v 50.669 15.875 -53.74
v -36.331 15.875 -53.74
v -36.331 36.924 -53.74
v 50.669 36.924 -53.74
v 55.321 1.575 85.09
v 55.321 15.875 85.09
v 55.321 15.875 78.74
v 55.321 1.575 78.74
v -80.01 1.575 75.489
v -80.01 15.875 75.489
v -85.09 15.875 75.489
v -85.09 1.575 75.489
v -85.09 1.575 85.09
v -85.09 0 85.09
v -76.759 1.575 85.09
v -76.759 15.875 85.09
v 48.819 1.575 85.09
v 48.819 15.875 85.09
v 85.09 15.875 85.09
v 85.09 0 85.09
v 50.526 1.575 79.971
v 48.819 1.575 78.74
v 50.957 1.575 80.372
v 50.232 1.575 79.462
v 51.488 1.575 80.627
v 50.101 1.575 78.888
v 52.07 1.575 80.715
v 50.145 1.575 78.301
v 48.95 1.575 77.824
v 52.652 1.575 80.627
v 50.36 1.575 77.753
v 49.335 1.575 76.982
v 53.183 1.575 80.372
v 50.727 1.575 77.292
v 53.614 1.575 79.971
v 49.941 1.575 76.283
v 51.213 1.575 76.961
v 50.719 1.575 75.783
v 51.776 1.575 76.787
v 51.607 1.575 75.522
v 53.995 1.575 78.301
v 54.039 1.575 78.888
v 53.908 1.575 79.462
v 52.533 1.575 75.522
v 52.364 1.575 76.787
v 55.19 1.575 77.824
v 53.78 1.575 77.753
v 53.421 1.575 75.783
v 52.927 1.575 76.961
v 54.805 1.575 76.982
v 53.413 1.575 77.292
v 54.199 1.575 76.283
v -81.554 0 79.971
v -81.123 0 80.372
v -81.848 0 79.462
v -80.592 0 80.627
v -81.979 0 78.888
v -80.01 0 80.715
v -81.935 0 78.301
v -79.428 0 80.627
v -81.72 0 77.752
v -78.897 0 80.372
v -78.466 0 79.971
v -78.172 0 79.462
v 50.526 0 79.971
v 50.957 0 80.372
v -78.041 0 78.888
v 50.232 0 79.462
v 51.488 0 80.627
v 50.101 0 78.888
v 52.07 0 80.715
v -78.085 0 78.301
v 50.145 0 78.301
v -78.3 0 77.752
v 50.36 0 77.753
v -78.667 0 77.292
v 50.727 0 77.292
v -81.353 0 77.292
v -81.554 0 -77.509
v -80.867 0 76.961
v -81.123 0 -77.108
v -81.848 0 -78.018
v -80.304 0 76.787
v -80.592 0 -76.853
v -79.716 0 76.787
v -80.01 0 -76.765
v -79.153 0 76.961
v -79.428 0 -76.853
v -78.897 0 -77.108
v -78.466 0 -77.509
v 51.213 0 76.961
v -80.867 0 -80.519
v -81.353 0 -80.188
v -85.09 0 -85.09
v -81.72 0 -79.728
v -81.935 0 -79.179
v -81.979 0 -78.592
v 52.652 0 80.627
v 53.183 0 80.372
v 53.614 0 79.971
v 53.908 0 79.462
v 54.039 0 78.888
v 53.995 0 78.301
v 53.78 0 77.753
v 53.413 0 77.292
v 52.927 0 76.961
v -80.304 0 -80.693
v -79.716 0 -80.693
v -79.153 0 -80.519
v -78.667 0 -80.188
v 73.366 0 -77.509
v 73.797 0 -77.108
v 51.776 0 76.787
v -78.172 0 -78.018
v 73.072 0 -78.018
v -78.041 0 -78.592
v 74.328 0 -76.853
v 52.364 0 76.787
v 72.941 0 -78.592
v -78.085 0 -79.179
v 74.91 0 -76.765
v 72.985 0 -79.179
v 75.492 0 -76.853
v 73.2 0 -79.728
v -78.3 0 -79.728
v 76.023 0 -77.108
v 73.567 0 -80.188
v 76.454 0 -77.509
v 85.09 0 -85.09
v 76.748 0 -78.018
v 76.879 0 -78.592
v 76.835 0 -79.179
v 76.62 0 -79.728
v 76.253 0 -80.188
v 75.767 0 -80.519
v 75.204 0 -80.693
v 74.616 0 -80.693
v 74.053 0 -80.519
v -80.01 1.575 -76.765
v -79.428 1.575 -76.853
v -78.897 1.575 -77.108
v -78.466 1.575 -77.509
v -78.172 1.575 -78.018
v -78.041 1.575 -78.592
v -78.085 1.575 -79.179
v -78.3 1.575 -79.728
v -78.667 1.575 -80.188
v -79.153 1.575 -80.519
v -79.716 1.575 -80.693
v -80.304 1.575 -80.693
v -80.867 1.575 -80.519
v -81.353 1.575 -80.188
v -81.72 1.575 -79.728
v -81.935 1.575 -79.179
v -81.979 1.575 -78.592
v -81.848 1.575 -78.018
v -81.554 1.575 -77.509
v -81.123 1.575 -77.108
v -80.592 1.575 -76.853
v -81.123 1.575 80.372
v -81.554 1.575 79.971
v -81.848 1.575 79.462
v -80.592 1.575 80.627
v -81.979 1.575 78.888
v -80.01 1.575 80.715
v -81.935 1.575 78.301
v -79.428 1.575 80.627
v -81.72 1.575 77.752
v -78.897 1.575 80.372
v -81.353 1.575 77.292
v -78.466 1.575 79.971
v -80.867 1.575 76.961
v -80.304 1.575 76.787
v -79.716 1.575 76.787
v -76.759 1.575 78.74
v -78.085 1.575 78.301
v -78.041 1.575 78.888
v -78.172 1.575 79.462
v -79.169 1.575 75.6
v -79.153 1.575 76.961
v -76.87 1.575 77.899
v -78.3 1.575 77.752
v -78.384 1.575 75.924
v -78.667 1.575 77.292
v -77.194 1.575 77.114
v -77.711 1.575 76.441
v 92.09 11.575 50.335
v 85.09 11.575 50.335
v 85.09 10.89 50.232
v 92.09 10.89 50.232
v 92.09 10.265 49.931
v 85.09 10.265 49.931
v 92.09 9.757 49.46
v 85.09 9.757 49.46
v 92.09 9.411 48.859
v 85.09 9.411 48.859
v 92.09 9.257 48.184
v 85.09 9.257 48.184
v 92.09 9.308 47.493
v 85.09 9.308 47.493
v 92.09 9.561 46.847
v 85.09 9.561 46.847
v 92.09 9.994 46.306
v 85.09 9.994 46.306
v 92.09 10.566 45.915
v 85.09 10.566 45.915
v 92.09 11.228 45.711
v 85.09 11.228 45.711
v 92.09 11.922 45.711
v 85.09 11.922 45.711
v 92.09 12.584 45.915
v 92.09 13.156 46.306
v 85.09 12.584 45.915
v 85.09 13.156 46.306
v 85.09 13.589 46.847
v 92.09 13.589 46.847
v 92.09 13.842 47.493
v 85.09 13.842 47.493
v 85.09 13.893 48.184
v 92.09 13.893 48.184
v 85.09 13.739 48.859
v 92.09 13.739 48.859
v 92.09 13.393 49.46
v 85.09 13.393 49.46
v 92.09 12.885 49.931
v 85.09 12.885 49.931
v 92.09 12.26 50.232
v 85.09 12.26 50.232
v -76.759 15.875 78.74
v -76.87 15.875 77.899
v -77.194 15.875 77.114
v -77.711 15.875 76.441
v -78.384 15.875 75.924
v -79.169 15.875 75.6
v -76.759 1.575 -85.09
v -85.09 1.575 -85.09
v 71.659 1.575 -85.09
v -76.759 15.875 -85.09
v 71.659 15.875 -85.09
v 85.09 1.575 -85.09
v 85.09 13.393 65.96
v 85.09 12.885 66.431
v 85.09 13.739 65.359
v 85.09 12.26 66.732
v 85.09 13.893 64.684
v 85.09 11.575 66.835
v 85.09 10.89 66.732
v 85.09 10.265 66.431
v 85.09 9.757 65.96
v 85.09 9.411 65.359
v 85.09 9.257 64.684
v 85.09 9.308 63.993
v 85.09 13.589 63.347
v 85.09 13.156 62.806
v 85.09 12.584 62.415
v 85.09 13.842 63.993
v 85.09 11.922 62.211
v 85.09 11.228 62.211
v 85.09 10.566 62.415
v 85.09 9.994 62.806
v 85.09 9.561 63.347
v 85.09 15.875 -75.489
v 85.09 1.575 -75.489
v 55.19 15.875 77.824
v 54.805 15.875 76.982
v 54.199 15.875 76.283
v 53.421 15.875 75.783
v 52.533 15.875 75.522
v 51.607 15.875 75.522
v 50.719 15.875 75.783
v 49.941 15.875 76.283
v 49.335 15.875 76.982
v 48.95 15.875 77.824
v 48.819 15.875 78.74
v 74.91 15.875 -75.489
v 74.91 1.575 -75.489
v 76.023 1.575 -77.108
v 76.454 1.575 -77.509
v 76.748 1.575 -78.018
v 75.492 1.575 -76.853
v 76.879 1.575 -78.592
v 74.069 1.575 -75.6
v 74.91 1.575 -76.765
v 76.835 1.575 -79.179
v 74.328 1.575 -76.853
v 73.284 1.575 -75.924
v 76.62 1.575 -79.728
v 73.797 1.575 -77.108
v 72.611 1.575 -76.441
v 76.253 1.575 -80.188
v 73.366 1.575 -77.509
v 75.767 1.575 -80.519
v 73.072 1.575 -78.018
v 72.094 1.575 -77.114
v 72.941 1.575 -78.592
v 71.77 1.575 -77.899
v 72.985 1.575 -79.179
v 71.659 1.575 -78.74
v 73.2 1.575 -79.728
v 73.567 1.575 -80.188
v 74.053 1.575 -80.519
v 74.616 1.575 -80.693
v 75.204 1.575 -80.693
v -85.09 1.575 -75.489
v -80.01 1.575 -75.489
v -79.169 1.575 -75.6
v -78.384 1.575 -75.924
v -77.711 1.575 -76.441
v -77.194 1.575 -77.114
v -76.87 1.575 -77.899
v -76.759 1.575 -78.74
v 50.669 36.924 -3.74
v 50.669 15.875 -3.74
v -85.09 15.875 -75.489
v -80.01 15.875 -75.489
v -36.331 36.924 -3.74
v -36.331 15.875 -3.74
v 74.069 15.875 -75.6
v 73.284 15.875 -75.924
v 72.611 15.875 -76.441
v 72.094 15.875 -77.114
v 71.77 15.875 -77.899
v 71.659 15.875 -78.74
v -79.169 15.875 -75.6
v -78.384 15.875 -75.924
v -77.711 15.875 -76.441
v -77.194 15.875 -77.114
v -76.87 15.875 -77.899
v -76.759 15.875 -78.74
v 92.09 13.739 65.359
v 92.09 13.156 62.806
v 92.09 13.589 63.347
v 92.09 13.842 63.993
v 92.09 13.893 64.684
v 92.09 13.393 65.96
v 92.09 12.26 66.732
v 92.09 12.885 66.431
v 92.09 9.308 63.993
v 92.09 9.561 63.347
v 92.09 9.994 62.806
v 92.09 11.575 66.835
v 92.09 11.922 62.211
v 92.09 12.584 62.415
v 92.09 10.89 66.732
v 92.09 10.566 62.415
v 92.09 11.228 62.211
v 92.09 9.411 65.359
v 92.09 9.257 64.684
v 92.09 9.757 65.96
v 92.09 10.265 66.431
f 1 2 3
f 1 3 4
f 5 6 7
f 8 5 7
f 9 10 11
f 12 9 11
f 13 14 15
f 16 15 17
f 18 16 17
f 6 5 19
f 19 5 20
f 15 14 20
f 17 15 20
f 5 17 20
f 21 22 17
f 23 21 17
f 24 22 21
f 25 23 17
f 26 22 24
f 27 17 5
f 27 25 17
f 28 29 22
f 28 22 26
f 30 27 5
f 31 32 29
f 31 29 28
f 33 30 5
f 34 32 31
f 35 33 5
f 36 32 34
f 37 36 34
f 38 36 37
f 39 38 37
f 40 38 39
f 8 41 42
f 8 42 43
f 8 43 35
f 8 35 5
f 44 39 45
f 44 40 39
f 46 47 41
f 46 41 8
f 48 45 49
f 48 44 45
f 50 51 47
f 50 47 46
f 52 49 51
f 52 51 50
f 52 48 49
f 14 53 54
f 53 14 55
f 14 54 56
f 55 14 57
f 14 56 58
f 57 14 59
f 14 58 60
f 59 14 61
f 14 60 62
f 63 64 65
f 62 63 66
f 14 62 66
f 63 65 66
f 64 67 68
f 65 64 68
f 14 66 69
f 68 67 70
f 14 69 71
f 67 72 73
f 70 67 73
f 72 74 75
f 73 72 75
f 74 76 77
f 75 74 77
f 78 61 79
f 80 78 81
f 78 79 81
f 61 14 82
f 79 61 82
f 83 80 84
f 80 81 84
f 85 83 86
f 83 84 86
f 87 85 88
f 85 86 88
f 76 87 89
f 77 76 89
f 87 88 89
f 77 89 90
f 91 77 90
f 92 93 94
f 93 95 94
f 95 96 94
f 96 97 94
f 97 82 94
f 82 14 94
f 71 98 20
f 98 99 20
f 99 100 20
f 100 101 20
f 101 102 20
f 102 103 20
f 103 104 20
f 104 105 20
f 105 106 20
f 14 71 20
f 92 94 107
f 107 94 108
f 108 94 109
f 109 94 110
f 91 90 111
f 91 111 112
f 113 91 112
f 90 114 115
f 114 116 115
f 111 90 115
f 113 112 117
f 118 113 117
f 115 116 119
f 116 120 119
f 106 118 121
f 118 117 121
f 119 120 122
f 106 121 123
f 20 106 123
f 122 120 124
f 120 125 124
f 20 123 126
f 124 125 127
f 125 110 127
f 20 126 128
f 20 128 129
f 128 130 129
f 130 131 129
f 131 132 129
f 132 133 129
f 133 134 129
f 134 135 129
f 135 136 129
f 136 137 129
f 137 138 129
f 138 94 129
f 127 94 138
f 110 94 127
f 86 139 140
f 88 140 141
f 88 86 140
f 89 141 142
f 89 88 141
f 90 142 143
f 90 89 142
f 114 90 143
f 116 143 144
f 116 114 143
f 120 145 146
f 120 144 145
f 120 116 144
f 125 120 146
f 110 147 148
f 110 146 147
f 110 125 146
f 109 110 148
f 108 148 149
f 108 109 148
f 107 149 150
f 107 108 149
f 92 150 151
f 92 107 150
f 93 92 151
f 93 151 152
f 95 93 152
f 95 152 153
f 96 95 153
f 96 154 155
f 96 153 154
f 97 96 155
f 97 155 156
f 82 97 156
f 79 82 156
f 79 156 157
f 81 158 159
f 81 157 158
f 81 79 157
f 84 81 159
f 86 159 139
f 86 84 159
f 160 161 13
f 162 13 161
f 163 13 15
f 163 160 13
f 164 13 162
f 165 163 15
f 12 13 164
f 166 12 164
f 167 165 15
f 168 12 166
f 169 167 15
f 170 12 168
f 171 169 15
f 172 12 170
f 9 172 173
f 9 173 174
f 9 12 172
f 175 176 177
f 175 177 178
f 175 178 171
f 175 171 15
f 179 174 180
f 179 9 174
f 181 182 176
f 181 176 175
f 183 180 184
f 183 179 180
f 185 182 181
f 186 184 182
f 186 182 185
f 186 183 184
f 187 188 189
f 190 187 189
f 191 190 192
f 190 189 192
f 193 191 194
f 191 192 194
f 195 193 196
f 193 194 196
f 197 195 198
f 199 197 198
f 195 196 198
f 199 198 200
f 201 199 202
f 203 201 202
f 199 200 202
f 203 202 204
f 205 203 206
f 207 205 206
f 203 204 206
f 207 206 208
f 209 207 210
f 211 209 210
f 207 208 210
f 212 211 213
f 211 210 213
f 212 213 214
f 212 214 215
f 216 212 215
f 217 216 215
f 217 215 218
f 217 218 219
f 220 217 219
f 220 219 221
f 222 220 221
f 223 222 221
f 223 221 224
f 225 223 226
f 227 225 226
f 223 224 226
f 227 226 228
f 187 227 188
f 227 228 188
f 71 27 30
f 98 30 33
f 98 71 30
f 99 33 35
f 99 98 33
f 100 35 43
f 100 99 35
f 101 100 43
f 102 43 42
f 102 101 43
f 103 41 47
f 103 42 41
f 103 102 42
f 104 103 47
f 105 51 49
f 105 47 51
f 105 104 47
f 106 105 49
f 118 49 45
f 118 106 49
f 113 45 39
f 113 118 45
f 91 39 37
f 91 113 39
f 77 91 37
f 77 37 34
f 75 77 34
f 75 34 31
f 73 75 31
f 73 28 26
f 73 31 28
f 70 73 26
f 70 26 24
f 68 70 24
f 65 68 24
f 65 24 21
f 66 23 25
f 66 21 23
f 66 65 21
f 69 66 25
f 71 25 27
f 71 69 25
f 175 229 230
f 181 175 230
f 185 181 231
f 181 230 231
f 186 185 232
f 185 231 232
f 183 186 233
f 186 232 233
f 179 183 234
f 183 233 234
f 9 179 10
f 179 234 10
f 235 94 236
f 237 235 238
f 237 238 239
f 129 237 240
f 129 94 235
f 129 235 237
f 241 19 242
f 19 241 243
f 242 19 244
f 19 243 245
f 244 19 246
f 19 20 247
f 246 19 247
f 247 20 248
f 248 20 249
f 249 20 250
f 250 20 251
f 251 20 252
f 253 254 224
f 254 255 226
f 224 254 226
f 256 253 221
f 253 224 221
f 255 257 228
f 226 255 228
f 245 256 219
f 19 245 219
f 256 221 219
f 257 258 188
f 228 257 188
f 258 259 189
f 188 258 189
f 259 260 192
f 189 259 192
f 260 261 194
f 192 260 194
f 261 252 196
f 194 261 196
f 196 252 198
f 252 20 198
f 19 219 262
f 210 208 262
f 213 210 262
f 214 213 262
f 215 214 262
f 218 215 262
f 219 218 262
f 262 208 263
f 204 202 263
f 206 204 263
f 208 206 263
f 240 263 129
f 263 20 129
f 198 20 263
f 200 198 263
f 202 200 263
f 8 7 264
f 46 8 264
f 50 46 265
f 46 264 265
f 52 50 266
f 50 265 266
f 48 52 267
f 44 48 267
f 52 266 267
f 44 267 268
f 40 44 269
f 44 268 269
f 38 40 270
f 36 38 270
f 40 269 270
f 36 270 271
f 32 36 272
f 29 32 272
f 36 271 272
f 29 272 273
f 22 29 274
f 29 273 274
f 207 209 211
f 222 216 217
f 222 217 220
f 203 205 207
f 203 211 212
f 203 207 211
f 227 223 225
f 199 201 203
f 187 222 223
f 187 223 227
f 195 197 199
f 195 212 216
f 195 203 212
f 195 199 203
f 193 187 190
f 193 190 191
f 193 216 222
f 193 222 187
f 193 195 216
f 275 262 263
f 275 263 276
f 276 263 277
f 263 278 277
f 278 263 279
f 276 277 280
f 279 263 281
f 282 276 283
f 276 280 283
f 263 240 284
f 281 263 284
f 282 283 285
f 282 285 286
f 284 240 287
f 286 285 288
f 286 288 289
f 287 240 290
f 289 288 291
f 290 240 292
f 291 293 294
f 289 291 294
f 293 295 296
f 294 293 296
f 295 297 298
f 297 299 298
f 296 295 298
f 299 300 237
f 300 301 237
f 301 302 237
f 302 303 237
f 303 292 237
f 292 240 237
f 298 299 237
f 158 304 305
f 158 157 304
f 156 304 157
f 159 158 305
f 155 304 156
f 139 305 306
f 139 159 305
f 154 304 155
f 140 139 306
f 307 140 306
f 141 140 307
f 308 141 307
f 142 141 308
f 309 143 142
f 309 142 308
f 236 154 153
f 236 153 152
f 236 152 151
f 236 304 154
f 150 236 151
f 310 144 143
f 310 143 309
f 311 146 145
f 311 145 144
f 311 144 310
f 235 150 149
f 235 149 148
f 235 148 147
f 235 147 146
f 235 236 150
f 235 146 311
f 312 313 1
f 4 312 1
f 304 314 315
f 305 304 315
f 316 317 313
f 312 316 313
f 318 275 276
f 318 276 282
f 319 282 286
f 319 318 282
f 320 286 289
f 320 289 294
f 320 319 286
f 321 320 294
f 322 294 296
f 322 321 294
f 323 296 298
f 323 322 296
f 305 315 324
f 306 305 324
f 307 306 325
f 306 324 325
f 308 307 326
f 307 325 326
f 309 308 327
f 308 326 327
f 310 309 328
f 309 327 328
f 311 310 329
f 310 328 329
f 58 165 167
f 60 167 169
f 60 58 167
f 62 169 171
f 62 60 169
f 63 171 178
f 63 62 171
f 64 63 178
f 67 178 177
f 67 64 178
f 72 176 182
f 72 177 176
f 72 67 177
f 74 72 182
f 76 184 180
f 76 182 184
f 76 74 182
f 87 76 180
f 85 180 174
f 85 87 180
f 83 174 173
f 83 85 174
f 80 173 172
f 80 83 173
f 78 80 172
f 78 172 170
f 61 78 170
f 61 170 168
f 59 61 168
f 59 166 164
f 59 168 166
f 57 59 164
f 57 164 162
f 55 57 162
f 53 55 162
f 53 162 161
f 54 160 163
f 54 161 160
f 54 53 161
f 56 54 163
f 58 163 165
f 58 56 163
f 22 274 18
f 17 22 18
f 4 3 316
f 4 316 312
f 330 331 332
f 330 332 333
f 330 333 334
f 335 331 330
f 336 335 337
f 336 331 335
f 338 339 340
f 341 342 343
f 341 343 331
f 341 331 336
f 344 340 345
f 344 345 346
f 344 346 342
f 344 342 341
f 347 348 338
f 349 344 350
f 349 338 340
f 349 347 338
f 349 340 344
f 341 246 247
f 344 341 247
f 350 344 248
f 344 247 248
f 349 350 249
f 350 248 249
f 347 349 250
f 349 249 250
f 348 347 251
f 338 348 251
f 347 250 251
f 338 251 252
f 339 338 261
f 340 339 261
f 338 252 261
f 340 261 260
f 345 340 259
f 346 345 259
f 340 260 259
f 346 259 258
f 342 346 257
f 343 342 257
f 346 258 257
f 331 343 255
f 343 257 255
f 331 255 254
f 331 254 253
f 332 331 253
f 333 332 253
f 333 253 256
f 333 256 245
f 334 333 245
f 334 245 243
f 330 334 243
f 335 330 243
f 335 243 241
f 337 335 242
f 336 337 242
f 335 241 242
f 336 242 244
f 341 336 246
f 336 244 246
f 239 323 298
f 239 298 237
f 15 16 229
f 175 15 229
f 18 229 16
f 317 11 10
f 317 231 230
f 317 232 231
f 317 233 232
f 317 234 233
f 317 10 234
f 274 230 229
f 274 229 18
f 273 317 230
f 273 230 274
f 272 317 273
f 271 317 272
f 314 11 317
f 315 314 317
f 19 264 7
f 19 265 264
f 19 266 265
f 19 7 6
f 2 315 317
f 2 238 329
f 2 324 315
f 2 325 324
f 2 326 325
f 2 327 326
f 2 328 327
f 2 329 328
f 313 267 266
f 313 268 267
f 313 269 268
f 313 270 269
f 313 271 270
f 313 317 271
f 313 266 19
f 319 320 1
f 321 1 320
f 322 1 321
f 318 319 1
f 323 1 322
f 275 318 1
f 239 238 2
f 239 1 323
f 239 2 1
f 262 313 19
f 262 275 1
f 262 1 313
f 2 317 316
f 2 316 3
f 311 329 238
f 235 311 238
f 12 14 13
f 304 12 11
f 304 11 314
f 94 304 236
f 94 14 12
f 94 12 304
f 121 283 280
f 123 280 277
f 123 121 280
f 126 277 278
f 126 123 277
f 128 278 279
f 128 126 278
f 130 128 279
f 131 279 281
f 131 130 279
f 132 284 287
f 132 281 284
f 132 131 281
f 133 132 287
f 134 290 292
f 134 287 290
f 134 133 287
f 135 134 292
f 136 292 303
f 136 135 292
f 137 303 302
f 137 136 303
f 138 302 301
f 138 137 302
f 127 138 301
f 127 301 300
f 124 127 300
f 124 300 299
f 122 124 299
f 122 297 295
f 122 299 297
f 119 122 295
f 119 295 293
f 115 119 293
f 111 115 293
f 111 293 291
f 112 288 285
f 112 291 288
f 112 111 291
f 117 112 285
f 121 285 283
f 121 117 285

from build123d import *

# Parameters (mm, degrees)
SKETCH1_W           = 170.18
SKETCH1_H           = 170.18
SKETCH1_R           = 1.9750024
SKETCH1_R_2         = 1.974999987
BOSS_EXTRUDE1_DEPTH = 15.875
CUT_EXTRUDE1_DEPTH  = 14.300000102
SKETCH4_W           = 86.99999999
SKETCH4_H           = 50.000000076
BOSS_EXTRUDE2_DEPTH = 21.048998796
SKETCH5_R           = 2.325000049
BOSS_EXTRUDE3_DEPTH = 6.99999997


with BuildPart() as part:
    # Sketch1 → Boss-Extrude1 (new body)
    with BuildSketch(Plane(origin=(0, 0, 0), x_dir=(1, 0, 0), z_dir=(0, 1, 0))):
        Rectangle(SKETCH1_W, SKETCH1_H)
        with Locations(Location((-80.01, 78.74, 0), (0, 0, 270))):
            Circle(SKETCH1_R, mode=Mode.SUBTRACT)
        with Locations(Location((74.91000004, 78.74, 0), (0, 0, 270))):
            Circle(SKETCH1_R, mode=Mode.SUBTRACT)
        with Locations(Location((-80.01, -78.74, 0), (0, 0, 270))):
            Circle(SKETCH1_R, mode=Mode.SUBTRACT)
        with Locations(Location((52.07, -78.74, 0), (0, 0, 270))):
            Circle(SKETCH1_R_2, mode=Mode.SUBTRACT)
    extrude(amount=BOSS_EXTRUDE1_DEPTH)

    # Sketch3 → Cut-Extrude1 (cut)
    with BuildSketch(Plane(origin=(0, 15.875, 0), x_dir=(1, 0, 0), z_dir=(0, 1, 0))):
        with BuildLine():
            Line((-76.7588, 78.74), (-76.7588, 85.09))
            Line((-76.7588, 85.09), (-85.09, 85.09))
            Line((-85.09, 85.09), (-85.09, 75.4888))
            Line((-85.09, 75.4888), (-80.01, 75.4888))
            ThreePointArc((-80.01, 75.4888), (-77.711054433, 76.441054433), (-76.7588, 78.74))
        make_face()
        with BuildLine():
            Line((71.65880004, 78.74), (71.65880004, 85.09))
            Line((71.65880004, 85.09), (85.09, 85.09))
            Line((85.09, 85.09), (85.09, 75.4888))
            Line((85.09, 75.4888), (74.91000004, 75.4888))
            ThreePointArc((74.91000004, 75.4888), (72.611054473, 76.441054433), (71.65880004, 78.74))
        make_face()
        with BuildLine():
            Line((48.8188, -78.74), (48.8188, -85.09))
            Line((48.8188, -85.09), (55.3212, -85.09))
            Line((55.3212, -85.09), (55.3212, -78.74))
            ThreePointArc((55.3212, -78.74), (52.07, -75.4888), (48.8188, -78.74))
        make_face()
        with BuildLine():
            Line((-80.01, -75.4888), (-85.09, -75.4888))
            Line((-85.09, -75.4888), (-85.09, -85.09))
            Line((-85.09, -85.09), (-76.7588, -85.09))
            Line((-76.7588, -85.09), (-76.7588, -78.74))
            ThreePointArc((-76.7588, -78.74), (-77.711054433, -76.441054433), (-80.01, -75.4888))
        make_face()
    extrude(amount=-CUT_EXTRUDE1_DEPTH, mode=Mode.SUBTRACT)

    # Sketch4 → Boss-Extrude2 (add)
    with BuildSketch(Plane(origin=(0, 15.875, 0), x_dir=(1, 0, 0), z_dir=(0, 1, 0))):
        with Locations((7.169000013, 28.739999924)):
            Rectangle(SKETCH4_W, SKETCH4_H)
    extrude(amount=BOSS_EXTRUDE2_DEPTH)

    # Sketch5 → Boss-Extrude3 (add)
    with BuildSketch(Plane(origin=(85.09, 0, 0), x_dir=(0, 0, -1), z_dir=(1, 0, 0))):
        with Locations(Location((-64.510000012, 11.574999964, 0), (0, 0, 180))):
            Circle(SKETCH5_R)
        with Locations(Location((-48.009999992, 11.574999964, 0), (0, 0, 180))):
            Circle(SKETCH5_R)
    extrude(amount=BOSS_EXTRUDE3_DEPTH)


solid = part.part
